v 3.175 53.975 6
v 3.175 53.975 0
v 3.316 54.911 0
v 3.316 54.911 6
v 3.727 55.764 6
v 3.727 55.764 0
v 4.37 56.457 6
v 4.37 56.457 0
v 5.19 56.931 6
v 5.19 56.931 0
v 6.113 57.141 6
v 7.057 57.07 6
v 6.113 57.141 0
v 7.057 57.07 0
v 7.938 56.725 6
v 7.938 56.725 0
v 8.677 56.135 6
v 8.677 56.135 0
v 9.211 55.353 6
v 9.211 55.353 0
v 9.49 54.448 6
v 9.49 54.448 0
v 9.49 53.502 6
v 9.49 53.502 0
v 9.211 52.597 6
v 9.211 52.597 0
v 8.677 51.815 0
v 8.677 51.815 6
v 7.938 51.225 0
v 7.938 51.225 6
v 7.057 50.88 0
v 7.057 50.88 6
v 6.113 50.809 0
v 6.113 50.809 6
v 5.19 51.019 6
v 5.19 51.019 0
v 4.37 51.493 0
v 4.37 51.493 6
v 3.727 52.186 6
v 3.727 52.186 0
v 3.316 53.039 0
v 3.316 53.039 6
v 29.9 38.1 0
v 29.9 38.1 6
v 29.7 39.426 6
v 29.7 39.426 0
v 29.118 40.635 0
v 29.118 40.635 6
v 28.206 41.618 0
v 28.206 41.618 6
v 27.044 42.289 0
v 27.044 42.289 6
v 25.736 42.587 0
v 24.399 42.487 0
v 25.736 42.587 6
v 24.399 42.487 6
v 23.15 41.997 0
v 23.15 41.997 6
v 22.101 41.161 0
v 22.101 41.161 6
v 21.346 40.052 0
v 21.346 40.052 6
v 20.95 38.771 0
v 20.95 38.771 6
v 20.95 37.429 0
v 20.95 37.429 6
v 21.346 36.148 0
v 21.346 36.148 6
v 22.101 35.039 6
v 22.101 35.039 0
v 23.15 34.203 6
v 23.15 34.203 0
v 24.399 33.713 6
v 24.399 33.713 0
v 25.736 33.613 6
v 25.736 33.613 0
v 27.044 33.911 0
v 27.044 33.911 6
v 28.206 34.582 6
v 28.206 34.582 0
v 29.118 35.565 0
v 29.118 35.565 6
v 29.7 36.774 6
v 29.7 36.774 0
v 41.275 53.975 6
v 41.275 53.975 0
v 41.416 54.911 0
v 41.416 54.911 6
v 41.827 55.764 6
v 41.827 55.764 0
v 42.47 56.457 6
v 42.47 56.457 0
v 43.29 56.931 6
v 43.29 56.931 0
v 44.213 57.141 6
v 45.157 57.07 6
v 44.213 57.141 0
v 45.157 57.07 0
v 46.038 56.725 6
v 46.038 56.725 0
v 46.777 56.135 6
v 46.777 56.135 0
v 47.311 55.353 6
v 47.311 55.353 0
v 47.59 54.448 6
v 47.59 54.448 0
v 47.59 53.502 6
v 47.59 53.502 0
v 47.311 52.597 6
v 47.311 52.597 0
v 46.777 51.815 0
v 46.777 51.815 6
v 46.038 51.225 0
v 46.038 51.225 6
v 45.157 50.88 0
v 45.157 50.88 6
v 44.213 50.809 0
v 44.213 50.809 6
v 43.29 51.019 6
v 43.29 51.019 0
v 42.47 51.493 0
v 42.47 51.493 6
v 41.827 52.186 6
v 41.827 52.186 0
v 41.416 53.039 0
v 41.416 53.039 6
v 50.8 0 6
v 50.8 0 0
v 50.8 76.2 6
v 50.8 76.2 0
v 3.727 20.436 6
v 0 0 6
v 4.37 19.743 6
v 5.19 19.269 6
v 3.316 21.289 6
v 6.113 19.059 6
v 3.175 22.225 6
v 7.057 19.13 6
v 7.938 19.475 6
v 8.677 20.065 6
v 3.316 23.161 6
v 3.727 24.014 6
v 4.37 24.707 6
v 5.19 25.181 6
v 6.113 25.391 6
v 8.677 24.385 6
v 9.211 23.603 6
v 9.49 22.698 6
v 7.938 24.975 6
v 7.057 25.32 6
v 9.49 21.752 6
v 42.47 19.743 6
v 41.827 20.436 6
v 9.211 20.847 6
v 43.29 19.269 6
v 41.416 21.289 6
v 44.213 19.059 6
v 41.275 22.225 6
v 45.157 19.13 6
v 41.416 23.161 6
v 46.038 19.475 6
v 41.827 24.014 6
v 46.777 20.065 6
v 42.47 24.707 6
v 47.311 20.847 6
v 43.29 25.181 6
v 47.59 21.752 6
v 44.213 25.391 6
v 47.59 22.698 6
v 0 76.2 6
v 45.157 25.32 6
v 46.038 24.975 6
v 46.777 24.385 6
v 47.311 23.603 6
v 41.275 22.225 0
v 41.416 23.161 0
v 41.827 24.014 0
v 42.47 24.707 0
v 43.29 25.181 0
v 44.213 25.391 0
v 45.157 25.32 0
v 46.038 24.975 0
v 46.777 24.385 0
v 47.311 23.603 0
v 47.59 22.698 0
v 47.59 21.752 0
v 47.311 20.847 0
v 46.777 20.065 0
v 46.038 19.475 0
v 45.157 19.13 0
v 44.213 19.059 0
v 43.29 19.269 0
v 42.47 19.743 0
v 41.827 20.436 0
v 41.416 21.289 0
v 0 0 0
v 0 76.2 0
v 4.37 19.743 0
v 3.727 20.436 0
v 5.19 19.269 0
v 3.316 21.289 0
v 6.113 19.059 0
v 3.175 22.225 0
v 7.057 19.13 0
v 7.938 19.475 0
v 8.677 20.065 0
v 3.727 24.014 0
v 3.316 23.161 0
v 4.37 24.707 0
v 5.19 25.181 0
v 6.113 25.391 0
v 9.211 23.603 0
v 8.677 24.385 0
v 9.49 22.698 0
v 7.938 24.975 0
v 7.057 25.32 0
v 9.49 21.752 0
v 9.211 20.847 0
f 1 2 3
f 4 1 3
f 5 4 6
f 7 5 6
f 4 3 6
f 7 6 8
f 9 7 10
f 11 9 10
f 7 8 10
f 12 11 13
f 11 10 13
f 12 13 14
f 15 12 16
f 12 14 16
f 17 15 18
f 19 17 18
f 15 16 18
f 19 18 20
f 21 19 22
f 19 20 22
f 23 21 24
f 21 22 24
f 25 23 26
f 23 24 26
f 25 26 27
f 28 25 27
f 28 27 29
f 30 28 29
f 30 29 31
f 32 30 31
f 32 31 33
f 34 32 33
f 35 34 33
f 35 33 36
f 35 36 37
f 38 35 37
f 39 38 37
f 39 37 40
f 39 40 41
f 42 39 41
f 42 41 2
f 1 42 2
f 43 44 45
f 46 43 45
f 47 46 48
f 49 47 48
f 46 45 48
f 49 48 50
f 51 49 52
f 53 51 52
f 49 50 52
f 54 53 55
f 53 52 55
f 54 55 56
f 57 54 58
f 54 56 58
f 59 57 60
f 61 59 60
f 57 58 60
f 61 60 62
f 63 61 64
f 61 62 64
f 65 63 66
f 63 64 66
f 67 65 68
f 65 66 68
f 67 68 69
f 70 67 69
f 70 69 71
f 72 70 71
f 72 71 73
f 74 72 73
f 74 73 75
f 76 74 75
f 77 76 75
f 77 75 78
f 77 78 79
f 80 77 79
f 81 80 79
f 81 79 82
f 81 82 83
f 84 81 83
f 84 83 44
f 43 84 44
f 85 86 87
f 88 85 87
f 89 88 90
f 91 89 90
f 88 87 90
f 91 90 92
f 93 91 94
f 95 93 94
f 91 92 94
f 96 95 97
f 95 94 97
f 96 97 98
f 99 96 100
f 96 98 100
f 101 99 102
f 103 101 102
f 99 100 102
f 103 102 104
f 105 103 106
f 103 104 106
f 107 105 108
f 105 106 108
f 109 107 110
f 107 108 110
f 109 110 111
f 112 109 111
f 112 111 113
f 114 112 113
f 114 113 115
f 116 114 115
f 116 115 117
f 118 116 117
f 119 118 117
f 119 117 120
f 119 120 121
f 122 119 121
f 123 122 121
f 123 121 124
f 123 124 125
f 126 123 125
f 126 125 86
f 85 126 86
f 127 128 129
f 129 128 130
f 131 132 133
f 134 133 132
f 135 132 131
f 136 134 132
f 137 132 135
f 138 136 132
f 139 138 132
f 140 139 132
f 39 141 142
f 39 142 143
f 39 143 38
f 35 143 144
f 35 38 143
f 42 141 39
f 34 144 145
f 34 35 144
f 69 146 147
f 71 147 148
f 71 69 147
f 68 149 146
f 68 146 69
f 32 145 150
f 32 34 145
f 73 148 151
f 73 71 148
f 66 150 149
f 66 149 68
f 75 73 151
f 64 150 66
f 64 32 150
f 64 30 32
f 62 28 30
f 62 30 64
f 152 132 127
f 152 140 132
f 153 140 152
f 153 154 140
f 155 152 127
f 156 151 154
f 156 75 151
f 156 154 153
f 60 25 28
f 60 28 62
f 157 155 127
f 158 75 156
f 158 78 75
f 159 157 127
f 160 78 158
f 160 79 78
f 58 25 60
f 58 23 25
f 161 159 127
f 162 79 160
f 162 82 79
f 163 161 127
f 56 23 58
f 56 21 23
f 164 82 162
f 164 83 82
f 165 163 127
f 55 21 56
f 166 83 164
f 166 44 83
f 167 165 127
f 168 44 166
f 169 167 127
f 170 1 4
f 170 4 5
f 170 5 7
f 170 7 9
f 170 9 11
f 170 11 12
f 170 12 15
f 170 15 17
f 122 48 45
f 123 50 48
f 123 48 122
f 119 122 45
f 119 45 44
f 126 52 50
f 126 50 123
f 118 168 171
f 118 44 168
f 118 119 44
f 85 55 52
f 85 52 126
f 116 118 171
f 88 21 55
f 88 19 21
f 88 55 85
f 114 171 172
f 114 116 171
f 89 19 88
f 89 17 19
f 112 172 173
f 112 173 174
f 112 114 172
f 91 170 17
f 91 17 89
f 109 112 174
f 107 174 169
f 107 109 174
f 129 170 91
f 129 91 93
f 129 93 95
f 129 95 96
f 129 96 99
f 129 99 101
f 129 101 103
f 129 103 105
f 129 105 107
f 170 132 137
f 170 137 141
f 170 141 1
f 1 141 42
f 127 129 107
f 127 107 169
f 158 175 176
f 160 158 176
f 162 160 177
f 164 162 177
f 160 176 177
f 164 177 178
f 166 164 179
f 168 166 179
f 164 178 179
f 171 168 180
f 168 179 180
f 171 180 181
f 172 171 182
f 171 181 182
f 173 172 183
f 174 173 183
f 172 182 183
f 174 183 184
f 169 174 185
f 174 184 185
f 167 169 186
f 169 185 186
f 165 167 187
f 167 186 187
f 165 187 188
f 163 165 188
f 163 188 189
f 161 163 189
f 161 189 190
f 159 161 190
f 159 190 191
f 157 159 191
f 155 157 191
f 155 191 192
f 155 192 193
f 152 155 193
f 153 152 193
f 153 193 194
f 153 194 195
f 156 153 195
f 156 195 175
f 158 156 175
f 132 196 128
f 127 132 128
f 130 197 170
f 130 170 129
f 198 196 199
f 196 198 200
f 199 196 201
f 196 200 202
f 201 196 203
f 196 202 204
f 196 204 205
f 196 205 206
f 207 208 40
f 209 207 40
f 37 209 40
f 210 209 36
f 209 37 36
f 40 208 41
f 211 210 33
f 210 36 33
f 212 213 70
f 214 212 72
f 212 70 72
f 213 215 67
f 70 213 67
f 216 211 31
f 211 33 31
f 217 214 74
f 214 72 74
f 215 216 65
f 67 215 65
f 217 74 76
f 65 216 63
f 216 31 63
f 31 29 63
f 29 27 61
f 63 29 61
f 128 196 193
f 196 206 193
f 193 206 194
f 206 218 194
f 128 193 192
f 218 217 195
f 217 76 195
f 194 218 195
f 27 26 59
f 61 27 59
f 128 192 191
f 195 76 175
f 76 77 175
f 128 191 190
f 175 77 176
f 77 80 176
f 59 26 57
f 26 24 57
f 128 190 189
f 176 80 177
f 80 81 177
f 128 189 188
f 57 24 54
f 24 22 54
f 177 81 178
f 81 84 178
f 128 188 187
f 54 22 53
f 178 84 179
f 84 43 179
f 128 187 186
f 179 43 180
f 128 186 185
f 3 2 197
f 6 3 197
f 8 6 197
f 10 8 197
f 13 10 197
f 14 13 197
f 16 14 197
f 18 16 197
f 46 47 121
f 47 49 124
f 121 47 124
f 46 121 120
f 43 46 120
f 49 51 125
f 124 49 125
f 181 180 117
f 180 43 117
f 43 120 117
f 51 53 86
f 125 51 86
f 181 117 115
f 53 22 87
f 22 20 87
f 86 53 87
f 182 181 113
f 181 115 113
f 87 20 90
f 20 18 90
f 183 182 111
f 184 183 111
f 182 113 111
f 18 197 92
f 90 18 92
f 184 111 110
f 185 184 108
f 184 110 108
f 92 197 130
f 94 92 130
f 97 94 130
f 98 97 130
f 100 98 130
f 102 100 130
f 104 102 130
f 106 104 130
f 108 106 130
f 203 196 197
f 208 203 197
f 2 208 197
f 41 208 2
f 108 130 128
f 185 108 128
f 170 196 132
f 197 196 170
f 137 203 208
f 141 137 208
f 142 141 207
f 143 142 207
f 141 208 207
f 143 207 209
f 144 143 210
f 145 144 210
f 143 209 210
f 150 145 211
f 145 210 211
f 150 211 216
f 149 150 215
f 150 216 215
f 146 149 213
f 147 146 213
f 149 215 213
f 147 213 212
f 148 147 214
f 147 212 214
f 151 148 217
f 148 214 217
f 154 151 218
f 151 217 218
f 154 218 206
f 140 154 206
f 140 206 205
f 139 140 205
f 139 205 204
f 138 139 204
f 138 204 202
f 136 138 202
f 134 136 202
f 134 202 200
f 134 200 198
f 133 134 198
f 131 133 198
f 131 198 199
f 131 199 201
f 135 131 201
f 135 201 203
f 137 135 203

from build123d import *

# Parameters (mm, degrees)
SKETCH1_W                   = 50.8
SKETCH1_H                   = 76.2
BOSS_EXTRUDE1_DEPTH         = 6
F_1_4_0_25_DIAMETER_HOLE1_D = 6.35
SKETCH5_R                   = 4.5
CUT_EXTRUDE1_DEPTH          = 7


with BuildPart() as part:
    # Sketch1 → Boss-Extrude1 (new body)
    with BuildSketch(Plane.XY):
        with Locations((25.4, 38.1)):
            Rectangle(SKETCH1_W, SKETCH1_H)
    extrude(amount=BOSS_EXTRUDE1_DEPTH)

    # 1/4 (0.25) Diameter Hole1 (through all)
    with Locations(Plane.XY.offset(6)):
        with Locations((44.45, 53.975), (6.35, 53.975), (6.35, 22.225), (44.45, 22.225)):
            Hole(F_1_4_0_25_DIAMETER_HOLE1_D / 2)

    # Sketch5 → Cut-Extrude1 (cut, through all)
    with BuildSketch(Plane.XY.offset(6)):
        with Locations((25.4, 38.1)):
            Circle(SKETCH5_R)
    extrude(amount=-CUT_EXTRUDE1_DEPTH, mode=Mode.SUBTRACT)


solid = part.part
